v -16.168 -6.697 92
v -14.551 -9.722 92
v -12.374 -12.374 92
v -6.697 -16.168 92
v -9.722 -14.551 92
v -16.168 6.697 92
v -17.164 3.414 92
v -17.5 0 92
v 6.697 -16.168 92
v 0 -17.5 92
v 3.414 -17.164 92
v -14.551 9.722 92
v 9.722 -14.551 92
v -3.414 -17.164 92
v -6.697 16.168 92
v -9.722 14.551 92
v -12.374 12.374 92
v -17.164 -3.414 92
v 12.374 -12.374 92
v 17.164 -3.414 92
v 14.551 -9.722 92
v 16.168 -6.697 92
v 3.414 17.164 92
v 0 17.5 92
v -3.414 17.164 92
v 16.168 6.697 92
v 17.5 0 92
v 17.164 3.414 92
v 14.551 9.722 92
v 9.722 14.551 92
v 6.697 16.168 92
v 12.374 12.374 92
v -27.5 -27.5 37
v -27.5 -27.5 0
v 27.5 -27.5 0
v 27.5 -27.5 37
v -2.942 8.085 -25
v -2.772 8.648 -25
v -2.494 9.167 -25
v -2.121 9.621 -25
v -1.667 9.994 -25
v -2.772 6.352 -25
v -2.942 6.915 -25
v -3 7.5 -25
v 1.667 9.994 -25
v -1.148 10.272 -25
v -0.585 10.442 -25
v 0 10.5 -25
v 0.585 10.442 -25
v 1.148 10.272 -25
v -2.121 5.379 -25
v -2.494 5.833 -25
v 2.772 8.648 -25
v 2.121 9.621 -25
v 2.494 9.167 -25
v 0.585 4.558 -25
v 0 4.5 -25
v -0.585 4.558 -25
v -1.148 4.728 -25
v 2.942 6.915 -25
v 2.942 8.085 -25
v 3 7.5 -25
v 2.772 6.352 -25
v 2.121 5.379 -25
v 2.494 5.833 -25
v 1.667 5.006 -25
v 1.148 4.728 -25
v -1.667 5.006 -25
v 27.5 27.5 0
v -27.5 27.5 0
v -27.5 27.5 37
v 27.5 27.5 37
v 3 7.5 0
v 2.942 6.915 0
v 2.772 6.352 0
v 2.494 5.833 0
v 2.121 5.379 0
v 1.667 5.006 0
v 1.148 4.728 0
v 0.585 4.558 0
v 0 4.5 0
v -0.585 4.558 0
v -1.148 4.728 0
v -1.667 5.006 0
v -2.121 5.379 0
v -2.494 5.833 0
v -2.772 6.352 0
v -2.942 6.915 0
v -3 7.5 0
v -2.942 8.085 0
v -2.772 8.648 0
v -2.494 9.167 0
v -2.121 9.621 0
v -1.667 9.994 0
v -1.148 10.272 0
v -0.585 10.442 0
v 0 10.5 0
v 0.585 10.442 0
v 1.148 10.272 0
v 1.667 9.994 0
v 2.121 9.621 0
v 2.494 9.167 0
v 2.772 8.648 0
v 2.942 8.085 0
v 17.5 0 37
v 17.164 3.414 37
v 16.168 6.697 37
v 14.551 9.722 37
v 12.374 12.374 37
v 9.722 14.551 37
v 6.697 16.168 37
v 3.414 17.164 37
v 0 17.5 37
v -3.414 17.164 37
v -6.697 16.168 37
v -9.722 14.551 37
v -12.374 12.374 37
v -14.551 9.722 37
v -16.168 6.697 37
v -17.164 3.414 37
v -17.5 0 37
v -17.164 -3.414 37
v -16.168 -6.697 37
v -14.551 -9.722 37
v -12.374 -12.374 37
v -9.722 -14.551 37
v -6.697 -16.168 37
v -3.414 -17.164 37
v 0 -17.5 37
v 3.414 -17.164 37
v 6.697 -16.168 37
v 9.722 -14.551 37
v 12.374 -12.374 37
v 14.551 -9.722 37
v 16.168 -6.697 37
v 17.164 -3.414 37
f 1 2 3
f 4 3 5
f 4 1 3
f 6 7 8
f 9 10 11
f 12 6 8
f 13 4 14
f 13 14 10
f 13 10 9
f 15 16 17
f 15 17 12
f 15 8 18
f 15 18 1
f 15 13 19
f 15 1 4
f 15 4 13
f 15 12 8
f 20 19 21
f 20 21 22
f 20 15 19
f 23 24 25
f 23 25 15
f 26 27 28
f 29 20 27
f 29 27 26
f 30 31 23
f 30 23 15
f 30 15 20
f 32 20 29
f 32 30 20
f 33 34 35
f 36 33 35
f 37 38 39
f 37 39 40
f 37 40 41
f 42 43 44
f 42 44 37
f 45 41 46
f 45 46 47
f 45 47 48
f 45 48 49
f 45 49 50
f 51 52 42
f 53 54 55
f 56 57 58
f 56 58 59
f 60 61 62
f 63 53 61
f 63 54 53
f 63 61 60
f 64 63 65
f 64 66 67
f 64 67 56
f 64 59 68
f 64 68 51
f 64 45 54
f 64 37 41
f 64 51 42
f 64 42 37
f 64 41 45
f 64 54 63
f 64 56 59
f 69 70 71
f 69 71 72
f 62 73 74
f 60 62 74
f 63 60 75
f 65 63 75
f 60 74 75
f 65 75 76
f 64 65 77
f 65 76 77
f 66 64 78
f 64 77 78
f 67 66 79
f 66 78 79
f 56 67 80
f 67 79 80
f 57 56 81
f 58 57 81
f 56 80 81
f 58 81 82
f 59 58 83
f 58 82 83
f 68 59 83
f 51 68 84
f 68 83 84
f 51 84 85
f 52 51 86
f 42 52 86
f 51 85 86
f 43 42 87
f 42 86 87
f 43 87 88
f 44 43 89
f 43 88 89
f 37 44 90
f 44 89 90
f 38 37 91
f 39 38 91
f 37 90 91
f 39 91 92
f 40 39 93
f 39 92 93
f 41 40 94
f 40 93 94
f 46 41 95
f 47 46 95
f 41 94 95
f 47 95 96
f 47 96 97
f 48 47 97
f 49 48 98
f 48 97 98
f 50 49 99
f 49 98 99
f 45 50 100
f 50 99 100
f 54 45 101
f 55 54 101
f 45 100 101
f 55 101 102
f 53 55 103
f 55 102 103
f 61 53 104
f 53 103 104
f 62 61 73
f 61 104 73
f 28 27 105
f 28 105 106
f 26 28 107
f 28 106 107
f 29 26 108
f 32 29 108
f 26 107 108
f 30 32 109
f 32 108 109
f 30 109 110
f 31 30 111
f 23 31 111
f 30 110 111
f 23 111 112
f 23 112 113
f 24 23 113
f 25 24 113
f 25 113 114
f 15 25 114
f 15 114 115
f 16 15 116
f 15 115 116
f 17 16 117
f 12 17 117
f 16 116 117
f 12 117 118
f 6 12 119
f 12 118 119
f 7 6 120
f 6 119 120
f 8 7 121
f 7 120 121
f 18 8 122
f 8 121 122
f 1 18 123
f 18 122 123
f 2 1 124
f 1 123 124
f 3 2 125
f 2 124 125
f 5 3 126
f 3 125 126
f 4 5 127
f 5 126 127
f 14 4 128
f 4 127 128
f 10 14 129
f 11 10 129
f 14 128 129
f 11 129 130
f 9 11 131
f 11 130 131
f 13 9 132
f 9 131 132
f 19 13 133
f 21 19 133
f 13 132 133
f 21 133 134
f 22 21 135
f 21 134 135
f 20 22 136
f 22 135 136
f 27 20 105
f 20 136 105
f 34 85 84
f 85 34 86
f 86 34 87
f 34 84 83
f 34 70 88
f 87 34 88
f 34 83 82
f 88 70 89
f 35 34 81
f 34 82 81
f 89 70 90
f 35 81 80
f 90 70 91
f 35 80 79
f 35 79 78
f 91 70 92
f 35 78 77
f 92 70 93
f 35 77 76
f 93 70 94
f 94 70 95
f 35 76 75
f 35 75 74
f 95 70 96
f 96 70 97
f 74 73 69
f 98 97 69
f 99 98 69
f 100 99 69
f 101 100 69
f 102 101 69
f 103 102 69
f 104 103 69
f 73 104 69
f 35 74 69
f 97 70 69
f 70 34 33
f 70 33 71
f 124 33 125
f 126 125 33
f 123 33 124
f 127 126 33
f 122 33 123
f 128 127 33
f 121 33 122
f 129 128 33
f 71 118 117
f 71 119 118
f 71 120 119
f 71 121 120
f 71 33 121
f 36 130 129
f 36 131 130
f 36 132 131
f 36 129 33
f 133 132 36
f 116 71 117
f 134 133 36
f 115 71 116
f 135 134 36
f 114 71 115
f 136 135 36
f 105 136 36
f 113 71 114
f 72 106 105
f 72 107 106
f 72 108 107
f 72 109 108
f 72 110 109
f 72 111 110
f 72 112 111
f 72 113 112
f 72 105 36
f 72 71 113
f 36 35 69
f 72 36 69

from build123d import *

# Parameters (mm, degrees)
SKETCH1_W           = 55
SKETCH1_H           = 55
BOSS_EXTRUDE1_DEPTH = 37
SKETCH2_R           = 17.5
BOSS_EXTRUDE2_DEPTH = 55
SKETCH3_R           = 3
BOSS_EXTRUDE3_DEPTH = 25


with BuildPart() as part:
    # Sketch1 → Boss-Extrude1 (new body)
    with BuildSketch(Plane.XY):
        Rectangle(SKETCH1_W, SKETCH1_H)
    extrude(amount=BOSS_EXTRUDE1_DEPTH)

    # Sketch2 → Boss-Extrude2 (add)
    with BuildSketch(Plane.XY.offset(37)):
        Circle(SKETCH2_R)
    extrude(amount=BOSS_EXTRUDE2_DEPTH)

    # Sketch3 → Boss-Extrude3 (add)
    with BuildSketch(Plane(origin=(0, 0, 0), x_dir=(-1, 0, 0), z_dir=(0, 0, -1))):
        with Locations(Location((0, 7.5, 0), (0, 0, 180))):
            Circle(SKETCH3_R)
    extrude(amount=BOSS_EXTRUDE3_DEPTH)


solid = part.part
